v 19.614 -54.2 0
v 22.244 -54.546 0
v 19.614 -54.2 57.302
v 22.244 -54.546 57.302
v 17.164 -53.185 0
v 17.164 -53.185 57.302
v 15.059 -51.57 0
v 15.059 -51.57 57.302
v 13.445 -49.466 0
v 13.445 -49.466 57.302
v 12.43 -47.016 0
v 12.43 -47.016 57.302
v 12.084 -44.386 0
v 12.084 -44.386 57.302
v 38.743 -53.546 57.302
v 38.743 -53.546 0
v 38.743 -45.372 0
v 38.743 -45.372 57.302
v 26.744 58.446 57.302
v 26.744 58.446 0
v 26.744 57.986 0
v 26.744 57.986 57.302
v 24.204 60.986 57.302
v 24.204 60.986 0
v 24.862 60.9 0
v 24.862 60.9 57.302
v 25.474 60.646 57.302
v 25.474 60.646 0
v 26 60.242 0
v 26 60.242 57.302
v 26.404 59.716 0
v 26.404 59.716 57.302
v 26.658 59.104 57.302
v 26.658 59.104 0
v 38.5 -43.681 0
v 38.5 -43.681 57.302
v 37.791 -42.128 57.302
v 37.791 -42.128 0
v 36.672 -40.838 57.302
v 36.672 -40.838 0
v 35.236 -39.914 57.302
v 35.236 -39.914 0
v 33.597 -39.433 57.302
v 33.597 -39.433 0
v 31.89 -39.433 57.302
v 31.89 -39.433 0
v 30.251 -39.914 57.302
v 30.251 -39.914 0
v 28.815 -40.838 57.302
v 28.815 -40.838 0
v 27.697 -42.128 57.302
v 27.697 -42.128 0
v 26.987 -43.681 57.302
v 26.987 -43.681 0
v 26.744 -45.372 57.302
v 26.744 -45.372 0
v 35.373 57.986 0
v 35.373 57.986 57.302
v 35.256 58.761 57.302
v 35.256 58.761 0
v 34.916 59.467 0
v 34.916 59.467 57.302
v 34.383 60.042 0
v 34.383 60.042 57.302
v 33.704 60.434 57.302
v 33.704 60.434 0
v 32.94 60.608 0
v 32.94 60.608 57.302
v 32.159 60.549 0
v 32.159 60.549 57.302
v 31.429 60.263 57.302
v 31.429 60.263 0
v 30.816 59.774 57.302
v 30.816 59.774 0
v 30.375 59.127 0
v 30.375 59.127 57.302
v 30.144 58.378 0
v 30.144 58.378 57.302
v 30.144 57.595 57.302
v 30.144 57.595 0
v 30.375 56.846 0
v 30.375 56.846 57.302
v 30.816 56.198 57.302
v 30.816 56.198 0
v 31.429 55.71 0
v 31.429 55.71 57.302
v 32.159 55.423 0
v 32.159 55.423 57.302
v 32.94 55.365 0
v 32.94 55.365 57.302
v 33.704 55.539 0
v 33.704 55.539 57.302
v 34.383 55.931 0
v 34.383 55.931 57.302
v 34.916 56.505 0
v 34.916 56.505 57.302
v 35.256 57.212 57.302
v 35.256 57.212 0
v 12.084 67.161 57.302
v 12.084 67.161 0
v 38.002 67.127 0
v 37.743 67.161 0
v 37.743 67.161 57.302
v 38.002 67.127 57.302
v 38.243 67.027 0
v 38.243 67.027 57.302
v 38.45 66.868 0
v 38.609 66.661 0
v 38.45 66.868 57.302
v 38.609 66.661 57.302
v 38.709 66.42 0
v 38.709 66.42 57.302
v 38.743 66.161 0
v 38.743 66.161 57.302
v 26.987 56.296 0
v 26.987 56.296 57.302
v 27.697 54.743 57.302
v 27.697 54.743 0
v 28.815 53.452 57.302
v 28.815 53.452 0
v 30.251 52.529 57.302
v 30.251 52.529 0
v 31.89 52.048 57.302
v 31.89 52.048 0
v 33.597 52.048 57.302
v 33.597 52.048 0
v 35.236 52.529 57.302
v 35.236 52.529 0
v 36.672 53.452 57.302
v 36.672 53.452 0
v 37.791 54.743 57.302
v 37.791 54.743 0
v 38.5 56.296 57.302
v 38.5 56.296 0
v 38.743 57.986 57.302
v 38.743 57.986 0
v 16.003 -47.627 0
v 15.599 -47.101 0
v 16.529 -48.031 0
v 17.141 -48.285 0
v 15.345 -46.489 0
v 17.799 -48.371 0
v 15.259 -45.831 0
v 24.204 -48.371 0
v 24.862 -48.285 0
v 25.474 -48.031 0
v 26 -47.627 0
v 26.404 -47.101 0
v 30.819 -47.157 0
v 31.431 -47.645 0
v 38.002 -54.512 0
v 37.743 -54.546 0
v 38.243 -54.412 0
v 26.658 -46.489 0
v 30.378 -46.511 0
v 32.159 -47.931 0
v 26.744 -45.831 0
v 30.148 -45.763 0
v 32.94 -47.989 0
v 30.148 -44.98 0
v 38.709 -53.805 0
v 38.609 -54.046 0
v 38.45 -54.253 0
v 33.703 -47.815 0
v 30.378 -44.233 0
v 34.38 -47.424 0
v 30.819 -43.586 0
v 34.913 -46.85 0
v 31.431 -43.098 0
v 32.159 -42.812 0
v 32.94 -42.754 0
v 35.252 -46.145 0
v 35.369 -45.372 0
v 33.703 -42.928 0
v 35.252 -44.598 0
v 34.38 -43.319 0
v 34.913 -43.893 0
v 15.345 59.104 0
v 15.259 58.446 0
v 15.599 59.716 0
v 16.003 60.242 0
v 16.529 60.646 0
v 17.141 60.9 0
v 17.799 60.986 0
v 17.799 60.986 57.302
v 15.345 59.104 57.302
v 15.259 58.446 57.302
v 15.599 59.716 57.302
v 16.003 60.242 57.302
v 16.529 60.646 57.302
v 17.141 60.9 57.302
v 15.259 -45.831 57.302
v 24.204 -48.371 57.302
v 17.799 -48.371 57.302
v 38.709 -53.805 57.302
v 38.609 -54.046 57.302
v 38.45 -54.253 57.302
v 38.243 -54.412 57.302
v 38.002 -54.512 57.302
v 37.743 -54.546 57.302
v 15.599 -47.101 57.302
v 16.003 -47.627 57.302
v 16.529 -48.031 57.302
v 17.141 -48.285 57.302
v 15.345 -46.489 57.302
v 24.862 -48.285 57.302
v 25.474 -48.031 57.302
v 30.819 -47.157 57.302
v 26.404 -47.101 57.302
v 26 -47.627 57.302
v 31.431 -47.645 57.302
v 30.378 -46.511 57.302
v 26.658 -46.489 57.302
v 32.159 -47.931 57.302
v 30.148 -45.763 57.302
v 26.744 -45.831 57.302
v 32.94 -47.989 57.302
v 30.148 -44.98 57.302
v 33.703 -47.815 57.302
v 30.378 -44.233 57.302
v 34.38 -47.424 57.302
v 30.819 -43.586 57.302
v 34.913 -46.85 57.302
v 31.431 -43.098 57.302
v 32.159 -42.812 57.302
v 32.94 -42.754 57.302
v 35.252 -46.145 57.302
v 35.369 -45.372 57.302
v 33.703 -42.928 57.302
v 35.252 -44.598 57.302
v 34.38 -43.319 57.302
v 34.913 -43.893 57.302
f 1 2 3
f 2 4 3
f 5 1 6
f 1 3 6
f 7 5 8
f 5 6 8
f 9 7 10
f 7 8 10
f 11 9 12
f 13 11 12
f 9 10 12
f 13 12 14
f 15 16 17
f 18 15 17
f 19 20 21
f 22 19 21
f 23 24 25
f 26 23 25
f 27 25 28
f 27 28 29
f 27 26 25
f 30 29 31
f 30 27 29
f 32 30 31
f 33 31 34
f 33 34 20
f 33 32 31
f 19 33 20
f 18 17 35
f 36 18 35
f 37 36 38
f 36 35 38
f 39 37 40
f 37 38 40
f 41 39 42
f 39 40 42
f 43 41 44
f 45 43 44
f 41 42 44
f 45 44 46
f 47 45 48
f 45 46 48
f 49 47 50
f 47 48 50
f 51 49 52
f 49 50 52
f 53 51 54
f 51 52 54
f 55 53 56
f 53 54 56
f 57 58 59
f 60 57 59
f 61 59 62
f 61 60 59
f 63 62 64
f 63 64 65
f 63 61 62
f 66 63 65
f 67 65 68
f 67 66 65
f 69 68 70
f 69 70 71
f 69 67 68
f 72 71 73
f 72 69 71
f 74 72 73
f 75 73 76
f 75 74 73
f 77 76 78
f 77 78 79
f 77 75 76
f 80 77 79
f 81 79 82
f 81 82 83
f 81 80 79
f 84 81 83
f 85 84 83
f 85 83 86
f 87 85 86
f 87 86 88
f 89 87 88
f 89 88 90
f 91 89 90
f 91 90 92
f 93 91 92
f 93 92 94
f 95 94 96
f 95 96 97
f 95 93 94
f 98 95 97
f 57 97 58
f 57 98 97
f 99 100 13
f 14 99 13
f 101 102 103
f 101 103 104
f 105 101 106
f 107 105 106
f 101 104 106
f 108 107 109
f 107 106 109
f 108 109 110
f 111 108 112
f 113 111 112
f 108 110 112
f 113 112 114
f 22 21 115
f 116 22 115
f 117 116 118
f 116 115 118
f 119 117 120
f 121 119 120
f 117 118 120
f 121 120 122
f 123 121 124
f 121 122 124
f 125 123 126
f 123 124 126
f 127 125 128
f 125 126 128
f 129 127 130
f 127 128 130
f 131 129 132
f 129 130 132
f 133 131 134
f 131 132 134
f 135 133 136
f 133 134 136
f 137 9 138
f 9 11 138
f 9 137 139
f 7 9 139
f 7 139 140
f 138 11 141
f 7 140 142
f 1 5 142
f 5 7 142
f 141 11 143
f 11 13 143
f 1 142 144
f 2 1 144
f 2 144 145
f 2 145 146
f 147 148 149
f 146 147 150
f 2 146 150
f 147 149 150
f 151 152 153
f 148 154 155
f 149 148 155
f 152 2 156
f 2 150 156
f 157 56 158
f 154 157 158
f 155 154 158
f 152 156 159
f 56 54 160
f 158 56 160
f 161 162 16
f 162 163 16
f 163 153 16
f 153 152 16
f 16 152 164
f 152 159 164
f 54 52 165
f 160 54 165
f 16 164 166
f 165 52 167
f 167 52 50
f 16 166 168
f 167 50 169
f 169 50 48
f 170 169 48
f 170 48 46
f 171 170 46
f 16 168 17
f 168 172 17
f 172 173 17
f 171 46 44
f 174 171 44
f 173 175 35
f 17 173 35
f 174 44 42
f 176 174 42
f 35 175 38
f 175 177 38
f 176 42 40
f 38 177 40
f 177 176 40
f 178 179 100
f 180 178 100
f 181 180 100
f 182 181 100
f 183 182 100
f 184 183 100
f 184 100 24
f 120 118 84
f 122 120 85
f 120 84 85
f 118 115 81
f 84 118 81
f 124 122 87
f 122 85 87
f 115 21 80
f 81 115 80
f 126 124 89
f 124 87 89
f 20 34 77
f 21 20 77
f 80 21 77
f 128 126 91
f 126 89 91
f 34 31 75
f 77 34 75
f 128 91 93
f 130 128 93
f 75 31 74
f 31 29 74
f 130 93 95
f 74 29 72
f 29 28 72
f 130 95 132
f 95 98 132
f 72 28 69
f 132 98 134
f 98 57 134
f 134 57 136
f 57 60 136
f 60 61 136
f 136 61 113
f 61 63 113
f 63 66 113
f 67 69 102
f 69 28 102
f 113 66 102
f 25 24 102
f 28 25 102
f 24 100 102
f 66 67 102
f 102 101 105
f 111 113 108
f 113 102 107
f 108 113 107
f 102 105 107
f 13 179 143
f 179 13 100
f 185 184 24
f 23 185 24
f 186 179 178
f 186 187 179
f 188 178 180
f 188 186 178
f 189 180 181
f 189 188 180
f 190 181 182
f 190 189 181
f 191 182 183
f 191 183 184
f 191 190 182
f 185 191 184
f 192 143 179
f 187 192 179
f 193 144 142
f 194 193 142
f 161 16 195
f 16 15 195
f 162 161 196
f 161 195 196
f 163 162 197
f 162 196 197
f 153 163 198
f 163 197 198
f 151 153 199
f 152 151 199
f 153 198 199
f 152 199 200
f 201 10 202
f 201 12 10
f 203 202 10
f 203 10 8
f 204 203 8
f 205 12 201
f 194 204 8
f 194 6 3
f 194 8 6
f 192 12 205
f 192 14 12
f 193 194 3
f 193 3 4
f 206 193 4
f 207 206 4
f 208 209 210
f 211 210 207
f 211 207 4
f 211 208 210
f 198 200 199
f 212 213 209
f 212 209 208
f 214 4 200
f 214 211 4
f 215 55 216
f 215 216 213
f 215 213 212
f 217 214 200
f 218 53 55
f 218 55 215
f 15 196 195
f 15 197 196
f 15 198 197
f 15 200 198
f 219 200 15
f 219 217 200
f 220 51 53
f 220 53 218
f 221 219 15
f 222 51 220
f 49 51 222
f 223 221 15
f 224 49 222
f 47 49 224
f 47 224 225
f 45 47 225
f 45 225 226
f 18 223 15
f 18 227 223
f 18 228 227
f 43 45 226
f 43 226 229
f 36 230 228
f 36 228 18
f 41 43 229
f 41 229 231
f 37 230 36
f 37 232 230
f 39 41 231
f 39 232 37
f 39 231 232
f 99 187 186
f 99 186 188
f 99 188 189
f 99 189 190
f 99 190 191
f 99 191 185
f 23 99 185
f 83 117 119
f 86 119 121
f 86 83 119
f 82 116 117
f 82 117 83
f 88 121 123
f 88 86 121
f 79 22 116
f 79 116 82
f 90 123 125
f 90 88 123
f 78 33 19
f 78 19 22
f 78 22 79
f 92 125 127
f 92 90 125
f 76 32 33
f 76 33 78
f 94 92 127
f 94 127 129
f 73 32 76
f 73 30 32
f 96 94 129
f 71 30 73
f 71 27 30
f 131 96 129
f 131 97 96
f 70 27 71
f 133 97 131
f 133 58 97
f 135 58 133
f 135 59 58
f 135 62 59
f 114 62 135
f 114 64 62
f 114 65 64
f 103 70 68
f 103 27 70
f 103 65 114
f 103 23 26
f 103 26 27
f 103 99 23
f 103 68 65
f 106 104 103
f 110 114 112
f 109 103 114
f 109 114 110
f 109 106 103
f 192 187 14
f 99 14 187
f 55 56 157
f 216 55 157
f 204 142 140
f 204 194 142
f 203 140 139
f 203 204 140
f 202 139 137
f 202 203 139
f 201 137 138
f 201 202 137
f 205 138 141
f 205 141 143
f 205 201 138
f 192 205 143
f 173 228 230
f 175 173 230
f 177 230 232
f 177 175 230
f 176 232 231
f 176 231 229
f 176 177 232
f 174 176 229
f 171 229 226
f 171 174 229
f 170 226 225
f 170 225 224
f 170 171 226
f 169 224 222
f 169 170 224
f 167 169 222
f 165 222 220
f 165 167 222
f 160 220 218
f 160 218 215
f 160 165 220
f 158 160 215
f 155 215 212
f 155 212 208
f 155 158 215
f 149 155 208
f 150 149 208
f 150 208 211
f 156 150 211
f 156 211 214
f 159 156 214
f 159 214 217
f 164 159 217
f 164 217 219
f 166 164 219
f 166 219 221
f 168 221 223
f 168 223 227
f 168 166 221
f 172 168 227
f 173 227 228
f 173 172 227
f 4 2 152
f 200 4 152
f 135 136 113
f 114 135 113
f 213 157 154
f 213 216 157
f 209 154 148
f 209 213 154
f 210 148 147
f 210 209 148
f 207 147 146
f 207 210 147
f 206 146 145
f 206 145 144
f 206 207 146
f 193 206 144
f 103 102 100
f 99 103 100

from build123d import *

# Parameters (mm, degrees)
SKETCH1_R           = 2.62509
SKETCH1_R_2         = 2.6289
BOSS_EXTRUDE1_DEPTH = 57.3024
FILLET1_R           = 2.54
FILLET2_R           = 1
FILLET3_R           = 10.16


with BuildPart() as part:
    # Sketch1 → Boss-Extrude1 (new body)
    with BuildSketch(Plane.XY):
        with BuildLine():
            Line((26.744137004, -45.371617498), (26.744137004, -48.371357498))
            Line((26.744137004, -48.371357498), (15.258617004, -48.371357498))
            Line((15.258617004, -48.371357498), (15.258617004, 60.986122502))
            Line((15.258617004, 60.986122502), (26.744137004, 60.986122502))
            Line((26.744137004, 60.986122502), (26.744137004, 57.986382502))
            ThreePointArc((26.744137004, 57.986382502), (32.743617004, 51.986902502), (38.743097004, 57.986382502))
            Line((38.743097004, 57.986382502), (38.743097004, 67.160862502))
            Line((38.743097004, 67.160862502), (32.743617004, 67.160862502))
            Line((32.743617004, 67.160862502), (12.083617004, 67.160862502))
            Line((12.083617004, 67.160862502), (12.083617004, -54.546097498))
            Line((12.083617004, -54.546097498), (32.743617004, -54.546097498))
            Line((32.743617004, -54.546097498), (38.743097004, -54.546097498))
            Line((38.743097004, -54.546097498), (38.743097004, -45.371617498))
            ThreePointArc((38.743097004, -45.371617498), (32.743617004, -39.372137498), (26.744137004, -45.371617498))
        make_face()
        with Locations((32.743617004, -45.371617498)):
            Circle(SKETCH1_R, mode=Mode.SUBTRACT)
        with Locations((32.743617004, 57.986382502)):
            Circle(SKETCH1_R_2, mode=Mode.SUBTRACT)
    extrude(amount=BOSS_EXTRUDE1_DEPTH)

    # Fillet1
    fillet1_edges = [part.edges().sort_by_distance(p)[0] for p in [
        (26.744137004, 60.986122502, 28.6512),
        (15.258617004, 60.986122502, 28.6512),
        (15.258617004, -48.371357498, 28.6512),
        (26.744137004, -48.371357498, 28.6512),
    ]]
    fillet(fillet1_edges, radius=FILLET1_R)

    # Fillet2
    fillet2_edges = [part.edges().sort_by_distance(p)[0] for p in [
        (38.743097004, -54.546097498, 28.6512),
        (38.743097004, 67.160862502, 28.6512),
    ]]
    fillet(fillet2_edges, radius=FILLET2_R)

    # Fillet3
    fillet3_edges = [part.edges().sort_by_distance(p)[0] for p in [
        (12.083617004, -54.546097498, 28.6512),
    ]]
    fillet(fillet3_edges, radius=FILLET3_R)


solid = part.part
